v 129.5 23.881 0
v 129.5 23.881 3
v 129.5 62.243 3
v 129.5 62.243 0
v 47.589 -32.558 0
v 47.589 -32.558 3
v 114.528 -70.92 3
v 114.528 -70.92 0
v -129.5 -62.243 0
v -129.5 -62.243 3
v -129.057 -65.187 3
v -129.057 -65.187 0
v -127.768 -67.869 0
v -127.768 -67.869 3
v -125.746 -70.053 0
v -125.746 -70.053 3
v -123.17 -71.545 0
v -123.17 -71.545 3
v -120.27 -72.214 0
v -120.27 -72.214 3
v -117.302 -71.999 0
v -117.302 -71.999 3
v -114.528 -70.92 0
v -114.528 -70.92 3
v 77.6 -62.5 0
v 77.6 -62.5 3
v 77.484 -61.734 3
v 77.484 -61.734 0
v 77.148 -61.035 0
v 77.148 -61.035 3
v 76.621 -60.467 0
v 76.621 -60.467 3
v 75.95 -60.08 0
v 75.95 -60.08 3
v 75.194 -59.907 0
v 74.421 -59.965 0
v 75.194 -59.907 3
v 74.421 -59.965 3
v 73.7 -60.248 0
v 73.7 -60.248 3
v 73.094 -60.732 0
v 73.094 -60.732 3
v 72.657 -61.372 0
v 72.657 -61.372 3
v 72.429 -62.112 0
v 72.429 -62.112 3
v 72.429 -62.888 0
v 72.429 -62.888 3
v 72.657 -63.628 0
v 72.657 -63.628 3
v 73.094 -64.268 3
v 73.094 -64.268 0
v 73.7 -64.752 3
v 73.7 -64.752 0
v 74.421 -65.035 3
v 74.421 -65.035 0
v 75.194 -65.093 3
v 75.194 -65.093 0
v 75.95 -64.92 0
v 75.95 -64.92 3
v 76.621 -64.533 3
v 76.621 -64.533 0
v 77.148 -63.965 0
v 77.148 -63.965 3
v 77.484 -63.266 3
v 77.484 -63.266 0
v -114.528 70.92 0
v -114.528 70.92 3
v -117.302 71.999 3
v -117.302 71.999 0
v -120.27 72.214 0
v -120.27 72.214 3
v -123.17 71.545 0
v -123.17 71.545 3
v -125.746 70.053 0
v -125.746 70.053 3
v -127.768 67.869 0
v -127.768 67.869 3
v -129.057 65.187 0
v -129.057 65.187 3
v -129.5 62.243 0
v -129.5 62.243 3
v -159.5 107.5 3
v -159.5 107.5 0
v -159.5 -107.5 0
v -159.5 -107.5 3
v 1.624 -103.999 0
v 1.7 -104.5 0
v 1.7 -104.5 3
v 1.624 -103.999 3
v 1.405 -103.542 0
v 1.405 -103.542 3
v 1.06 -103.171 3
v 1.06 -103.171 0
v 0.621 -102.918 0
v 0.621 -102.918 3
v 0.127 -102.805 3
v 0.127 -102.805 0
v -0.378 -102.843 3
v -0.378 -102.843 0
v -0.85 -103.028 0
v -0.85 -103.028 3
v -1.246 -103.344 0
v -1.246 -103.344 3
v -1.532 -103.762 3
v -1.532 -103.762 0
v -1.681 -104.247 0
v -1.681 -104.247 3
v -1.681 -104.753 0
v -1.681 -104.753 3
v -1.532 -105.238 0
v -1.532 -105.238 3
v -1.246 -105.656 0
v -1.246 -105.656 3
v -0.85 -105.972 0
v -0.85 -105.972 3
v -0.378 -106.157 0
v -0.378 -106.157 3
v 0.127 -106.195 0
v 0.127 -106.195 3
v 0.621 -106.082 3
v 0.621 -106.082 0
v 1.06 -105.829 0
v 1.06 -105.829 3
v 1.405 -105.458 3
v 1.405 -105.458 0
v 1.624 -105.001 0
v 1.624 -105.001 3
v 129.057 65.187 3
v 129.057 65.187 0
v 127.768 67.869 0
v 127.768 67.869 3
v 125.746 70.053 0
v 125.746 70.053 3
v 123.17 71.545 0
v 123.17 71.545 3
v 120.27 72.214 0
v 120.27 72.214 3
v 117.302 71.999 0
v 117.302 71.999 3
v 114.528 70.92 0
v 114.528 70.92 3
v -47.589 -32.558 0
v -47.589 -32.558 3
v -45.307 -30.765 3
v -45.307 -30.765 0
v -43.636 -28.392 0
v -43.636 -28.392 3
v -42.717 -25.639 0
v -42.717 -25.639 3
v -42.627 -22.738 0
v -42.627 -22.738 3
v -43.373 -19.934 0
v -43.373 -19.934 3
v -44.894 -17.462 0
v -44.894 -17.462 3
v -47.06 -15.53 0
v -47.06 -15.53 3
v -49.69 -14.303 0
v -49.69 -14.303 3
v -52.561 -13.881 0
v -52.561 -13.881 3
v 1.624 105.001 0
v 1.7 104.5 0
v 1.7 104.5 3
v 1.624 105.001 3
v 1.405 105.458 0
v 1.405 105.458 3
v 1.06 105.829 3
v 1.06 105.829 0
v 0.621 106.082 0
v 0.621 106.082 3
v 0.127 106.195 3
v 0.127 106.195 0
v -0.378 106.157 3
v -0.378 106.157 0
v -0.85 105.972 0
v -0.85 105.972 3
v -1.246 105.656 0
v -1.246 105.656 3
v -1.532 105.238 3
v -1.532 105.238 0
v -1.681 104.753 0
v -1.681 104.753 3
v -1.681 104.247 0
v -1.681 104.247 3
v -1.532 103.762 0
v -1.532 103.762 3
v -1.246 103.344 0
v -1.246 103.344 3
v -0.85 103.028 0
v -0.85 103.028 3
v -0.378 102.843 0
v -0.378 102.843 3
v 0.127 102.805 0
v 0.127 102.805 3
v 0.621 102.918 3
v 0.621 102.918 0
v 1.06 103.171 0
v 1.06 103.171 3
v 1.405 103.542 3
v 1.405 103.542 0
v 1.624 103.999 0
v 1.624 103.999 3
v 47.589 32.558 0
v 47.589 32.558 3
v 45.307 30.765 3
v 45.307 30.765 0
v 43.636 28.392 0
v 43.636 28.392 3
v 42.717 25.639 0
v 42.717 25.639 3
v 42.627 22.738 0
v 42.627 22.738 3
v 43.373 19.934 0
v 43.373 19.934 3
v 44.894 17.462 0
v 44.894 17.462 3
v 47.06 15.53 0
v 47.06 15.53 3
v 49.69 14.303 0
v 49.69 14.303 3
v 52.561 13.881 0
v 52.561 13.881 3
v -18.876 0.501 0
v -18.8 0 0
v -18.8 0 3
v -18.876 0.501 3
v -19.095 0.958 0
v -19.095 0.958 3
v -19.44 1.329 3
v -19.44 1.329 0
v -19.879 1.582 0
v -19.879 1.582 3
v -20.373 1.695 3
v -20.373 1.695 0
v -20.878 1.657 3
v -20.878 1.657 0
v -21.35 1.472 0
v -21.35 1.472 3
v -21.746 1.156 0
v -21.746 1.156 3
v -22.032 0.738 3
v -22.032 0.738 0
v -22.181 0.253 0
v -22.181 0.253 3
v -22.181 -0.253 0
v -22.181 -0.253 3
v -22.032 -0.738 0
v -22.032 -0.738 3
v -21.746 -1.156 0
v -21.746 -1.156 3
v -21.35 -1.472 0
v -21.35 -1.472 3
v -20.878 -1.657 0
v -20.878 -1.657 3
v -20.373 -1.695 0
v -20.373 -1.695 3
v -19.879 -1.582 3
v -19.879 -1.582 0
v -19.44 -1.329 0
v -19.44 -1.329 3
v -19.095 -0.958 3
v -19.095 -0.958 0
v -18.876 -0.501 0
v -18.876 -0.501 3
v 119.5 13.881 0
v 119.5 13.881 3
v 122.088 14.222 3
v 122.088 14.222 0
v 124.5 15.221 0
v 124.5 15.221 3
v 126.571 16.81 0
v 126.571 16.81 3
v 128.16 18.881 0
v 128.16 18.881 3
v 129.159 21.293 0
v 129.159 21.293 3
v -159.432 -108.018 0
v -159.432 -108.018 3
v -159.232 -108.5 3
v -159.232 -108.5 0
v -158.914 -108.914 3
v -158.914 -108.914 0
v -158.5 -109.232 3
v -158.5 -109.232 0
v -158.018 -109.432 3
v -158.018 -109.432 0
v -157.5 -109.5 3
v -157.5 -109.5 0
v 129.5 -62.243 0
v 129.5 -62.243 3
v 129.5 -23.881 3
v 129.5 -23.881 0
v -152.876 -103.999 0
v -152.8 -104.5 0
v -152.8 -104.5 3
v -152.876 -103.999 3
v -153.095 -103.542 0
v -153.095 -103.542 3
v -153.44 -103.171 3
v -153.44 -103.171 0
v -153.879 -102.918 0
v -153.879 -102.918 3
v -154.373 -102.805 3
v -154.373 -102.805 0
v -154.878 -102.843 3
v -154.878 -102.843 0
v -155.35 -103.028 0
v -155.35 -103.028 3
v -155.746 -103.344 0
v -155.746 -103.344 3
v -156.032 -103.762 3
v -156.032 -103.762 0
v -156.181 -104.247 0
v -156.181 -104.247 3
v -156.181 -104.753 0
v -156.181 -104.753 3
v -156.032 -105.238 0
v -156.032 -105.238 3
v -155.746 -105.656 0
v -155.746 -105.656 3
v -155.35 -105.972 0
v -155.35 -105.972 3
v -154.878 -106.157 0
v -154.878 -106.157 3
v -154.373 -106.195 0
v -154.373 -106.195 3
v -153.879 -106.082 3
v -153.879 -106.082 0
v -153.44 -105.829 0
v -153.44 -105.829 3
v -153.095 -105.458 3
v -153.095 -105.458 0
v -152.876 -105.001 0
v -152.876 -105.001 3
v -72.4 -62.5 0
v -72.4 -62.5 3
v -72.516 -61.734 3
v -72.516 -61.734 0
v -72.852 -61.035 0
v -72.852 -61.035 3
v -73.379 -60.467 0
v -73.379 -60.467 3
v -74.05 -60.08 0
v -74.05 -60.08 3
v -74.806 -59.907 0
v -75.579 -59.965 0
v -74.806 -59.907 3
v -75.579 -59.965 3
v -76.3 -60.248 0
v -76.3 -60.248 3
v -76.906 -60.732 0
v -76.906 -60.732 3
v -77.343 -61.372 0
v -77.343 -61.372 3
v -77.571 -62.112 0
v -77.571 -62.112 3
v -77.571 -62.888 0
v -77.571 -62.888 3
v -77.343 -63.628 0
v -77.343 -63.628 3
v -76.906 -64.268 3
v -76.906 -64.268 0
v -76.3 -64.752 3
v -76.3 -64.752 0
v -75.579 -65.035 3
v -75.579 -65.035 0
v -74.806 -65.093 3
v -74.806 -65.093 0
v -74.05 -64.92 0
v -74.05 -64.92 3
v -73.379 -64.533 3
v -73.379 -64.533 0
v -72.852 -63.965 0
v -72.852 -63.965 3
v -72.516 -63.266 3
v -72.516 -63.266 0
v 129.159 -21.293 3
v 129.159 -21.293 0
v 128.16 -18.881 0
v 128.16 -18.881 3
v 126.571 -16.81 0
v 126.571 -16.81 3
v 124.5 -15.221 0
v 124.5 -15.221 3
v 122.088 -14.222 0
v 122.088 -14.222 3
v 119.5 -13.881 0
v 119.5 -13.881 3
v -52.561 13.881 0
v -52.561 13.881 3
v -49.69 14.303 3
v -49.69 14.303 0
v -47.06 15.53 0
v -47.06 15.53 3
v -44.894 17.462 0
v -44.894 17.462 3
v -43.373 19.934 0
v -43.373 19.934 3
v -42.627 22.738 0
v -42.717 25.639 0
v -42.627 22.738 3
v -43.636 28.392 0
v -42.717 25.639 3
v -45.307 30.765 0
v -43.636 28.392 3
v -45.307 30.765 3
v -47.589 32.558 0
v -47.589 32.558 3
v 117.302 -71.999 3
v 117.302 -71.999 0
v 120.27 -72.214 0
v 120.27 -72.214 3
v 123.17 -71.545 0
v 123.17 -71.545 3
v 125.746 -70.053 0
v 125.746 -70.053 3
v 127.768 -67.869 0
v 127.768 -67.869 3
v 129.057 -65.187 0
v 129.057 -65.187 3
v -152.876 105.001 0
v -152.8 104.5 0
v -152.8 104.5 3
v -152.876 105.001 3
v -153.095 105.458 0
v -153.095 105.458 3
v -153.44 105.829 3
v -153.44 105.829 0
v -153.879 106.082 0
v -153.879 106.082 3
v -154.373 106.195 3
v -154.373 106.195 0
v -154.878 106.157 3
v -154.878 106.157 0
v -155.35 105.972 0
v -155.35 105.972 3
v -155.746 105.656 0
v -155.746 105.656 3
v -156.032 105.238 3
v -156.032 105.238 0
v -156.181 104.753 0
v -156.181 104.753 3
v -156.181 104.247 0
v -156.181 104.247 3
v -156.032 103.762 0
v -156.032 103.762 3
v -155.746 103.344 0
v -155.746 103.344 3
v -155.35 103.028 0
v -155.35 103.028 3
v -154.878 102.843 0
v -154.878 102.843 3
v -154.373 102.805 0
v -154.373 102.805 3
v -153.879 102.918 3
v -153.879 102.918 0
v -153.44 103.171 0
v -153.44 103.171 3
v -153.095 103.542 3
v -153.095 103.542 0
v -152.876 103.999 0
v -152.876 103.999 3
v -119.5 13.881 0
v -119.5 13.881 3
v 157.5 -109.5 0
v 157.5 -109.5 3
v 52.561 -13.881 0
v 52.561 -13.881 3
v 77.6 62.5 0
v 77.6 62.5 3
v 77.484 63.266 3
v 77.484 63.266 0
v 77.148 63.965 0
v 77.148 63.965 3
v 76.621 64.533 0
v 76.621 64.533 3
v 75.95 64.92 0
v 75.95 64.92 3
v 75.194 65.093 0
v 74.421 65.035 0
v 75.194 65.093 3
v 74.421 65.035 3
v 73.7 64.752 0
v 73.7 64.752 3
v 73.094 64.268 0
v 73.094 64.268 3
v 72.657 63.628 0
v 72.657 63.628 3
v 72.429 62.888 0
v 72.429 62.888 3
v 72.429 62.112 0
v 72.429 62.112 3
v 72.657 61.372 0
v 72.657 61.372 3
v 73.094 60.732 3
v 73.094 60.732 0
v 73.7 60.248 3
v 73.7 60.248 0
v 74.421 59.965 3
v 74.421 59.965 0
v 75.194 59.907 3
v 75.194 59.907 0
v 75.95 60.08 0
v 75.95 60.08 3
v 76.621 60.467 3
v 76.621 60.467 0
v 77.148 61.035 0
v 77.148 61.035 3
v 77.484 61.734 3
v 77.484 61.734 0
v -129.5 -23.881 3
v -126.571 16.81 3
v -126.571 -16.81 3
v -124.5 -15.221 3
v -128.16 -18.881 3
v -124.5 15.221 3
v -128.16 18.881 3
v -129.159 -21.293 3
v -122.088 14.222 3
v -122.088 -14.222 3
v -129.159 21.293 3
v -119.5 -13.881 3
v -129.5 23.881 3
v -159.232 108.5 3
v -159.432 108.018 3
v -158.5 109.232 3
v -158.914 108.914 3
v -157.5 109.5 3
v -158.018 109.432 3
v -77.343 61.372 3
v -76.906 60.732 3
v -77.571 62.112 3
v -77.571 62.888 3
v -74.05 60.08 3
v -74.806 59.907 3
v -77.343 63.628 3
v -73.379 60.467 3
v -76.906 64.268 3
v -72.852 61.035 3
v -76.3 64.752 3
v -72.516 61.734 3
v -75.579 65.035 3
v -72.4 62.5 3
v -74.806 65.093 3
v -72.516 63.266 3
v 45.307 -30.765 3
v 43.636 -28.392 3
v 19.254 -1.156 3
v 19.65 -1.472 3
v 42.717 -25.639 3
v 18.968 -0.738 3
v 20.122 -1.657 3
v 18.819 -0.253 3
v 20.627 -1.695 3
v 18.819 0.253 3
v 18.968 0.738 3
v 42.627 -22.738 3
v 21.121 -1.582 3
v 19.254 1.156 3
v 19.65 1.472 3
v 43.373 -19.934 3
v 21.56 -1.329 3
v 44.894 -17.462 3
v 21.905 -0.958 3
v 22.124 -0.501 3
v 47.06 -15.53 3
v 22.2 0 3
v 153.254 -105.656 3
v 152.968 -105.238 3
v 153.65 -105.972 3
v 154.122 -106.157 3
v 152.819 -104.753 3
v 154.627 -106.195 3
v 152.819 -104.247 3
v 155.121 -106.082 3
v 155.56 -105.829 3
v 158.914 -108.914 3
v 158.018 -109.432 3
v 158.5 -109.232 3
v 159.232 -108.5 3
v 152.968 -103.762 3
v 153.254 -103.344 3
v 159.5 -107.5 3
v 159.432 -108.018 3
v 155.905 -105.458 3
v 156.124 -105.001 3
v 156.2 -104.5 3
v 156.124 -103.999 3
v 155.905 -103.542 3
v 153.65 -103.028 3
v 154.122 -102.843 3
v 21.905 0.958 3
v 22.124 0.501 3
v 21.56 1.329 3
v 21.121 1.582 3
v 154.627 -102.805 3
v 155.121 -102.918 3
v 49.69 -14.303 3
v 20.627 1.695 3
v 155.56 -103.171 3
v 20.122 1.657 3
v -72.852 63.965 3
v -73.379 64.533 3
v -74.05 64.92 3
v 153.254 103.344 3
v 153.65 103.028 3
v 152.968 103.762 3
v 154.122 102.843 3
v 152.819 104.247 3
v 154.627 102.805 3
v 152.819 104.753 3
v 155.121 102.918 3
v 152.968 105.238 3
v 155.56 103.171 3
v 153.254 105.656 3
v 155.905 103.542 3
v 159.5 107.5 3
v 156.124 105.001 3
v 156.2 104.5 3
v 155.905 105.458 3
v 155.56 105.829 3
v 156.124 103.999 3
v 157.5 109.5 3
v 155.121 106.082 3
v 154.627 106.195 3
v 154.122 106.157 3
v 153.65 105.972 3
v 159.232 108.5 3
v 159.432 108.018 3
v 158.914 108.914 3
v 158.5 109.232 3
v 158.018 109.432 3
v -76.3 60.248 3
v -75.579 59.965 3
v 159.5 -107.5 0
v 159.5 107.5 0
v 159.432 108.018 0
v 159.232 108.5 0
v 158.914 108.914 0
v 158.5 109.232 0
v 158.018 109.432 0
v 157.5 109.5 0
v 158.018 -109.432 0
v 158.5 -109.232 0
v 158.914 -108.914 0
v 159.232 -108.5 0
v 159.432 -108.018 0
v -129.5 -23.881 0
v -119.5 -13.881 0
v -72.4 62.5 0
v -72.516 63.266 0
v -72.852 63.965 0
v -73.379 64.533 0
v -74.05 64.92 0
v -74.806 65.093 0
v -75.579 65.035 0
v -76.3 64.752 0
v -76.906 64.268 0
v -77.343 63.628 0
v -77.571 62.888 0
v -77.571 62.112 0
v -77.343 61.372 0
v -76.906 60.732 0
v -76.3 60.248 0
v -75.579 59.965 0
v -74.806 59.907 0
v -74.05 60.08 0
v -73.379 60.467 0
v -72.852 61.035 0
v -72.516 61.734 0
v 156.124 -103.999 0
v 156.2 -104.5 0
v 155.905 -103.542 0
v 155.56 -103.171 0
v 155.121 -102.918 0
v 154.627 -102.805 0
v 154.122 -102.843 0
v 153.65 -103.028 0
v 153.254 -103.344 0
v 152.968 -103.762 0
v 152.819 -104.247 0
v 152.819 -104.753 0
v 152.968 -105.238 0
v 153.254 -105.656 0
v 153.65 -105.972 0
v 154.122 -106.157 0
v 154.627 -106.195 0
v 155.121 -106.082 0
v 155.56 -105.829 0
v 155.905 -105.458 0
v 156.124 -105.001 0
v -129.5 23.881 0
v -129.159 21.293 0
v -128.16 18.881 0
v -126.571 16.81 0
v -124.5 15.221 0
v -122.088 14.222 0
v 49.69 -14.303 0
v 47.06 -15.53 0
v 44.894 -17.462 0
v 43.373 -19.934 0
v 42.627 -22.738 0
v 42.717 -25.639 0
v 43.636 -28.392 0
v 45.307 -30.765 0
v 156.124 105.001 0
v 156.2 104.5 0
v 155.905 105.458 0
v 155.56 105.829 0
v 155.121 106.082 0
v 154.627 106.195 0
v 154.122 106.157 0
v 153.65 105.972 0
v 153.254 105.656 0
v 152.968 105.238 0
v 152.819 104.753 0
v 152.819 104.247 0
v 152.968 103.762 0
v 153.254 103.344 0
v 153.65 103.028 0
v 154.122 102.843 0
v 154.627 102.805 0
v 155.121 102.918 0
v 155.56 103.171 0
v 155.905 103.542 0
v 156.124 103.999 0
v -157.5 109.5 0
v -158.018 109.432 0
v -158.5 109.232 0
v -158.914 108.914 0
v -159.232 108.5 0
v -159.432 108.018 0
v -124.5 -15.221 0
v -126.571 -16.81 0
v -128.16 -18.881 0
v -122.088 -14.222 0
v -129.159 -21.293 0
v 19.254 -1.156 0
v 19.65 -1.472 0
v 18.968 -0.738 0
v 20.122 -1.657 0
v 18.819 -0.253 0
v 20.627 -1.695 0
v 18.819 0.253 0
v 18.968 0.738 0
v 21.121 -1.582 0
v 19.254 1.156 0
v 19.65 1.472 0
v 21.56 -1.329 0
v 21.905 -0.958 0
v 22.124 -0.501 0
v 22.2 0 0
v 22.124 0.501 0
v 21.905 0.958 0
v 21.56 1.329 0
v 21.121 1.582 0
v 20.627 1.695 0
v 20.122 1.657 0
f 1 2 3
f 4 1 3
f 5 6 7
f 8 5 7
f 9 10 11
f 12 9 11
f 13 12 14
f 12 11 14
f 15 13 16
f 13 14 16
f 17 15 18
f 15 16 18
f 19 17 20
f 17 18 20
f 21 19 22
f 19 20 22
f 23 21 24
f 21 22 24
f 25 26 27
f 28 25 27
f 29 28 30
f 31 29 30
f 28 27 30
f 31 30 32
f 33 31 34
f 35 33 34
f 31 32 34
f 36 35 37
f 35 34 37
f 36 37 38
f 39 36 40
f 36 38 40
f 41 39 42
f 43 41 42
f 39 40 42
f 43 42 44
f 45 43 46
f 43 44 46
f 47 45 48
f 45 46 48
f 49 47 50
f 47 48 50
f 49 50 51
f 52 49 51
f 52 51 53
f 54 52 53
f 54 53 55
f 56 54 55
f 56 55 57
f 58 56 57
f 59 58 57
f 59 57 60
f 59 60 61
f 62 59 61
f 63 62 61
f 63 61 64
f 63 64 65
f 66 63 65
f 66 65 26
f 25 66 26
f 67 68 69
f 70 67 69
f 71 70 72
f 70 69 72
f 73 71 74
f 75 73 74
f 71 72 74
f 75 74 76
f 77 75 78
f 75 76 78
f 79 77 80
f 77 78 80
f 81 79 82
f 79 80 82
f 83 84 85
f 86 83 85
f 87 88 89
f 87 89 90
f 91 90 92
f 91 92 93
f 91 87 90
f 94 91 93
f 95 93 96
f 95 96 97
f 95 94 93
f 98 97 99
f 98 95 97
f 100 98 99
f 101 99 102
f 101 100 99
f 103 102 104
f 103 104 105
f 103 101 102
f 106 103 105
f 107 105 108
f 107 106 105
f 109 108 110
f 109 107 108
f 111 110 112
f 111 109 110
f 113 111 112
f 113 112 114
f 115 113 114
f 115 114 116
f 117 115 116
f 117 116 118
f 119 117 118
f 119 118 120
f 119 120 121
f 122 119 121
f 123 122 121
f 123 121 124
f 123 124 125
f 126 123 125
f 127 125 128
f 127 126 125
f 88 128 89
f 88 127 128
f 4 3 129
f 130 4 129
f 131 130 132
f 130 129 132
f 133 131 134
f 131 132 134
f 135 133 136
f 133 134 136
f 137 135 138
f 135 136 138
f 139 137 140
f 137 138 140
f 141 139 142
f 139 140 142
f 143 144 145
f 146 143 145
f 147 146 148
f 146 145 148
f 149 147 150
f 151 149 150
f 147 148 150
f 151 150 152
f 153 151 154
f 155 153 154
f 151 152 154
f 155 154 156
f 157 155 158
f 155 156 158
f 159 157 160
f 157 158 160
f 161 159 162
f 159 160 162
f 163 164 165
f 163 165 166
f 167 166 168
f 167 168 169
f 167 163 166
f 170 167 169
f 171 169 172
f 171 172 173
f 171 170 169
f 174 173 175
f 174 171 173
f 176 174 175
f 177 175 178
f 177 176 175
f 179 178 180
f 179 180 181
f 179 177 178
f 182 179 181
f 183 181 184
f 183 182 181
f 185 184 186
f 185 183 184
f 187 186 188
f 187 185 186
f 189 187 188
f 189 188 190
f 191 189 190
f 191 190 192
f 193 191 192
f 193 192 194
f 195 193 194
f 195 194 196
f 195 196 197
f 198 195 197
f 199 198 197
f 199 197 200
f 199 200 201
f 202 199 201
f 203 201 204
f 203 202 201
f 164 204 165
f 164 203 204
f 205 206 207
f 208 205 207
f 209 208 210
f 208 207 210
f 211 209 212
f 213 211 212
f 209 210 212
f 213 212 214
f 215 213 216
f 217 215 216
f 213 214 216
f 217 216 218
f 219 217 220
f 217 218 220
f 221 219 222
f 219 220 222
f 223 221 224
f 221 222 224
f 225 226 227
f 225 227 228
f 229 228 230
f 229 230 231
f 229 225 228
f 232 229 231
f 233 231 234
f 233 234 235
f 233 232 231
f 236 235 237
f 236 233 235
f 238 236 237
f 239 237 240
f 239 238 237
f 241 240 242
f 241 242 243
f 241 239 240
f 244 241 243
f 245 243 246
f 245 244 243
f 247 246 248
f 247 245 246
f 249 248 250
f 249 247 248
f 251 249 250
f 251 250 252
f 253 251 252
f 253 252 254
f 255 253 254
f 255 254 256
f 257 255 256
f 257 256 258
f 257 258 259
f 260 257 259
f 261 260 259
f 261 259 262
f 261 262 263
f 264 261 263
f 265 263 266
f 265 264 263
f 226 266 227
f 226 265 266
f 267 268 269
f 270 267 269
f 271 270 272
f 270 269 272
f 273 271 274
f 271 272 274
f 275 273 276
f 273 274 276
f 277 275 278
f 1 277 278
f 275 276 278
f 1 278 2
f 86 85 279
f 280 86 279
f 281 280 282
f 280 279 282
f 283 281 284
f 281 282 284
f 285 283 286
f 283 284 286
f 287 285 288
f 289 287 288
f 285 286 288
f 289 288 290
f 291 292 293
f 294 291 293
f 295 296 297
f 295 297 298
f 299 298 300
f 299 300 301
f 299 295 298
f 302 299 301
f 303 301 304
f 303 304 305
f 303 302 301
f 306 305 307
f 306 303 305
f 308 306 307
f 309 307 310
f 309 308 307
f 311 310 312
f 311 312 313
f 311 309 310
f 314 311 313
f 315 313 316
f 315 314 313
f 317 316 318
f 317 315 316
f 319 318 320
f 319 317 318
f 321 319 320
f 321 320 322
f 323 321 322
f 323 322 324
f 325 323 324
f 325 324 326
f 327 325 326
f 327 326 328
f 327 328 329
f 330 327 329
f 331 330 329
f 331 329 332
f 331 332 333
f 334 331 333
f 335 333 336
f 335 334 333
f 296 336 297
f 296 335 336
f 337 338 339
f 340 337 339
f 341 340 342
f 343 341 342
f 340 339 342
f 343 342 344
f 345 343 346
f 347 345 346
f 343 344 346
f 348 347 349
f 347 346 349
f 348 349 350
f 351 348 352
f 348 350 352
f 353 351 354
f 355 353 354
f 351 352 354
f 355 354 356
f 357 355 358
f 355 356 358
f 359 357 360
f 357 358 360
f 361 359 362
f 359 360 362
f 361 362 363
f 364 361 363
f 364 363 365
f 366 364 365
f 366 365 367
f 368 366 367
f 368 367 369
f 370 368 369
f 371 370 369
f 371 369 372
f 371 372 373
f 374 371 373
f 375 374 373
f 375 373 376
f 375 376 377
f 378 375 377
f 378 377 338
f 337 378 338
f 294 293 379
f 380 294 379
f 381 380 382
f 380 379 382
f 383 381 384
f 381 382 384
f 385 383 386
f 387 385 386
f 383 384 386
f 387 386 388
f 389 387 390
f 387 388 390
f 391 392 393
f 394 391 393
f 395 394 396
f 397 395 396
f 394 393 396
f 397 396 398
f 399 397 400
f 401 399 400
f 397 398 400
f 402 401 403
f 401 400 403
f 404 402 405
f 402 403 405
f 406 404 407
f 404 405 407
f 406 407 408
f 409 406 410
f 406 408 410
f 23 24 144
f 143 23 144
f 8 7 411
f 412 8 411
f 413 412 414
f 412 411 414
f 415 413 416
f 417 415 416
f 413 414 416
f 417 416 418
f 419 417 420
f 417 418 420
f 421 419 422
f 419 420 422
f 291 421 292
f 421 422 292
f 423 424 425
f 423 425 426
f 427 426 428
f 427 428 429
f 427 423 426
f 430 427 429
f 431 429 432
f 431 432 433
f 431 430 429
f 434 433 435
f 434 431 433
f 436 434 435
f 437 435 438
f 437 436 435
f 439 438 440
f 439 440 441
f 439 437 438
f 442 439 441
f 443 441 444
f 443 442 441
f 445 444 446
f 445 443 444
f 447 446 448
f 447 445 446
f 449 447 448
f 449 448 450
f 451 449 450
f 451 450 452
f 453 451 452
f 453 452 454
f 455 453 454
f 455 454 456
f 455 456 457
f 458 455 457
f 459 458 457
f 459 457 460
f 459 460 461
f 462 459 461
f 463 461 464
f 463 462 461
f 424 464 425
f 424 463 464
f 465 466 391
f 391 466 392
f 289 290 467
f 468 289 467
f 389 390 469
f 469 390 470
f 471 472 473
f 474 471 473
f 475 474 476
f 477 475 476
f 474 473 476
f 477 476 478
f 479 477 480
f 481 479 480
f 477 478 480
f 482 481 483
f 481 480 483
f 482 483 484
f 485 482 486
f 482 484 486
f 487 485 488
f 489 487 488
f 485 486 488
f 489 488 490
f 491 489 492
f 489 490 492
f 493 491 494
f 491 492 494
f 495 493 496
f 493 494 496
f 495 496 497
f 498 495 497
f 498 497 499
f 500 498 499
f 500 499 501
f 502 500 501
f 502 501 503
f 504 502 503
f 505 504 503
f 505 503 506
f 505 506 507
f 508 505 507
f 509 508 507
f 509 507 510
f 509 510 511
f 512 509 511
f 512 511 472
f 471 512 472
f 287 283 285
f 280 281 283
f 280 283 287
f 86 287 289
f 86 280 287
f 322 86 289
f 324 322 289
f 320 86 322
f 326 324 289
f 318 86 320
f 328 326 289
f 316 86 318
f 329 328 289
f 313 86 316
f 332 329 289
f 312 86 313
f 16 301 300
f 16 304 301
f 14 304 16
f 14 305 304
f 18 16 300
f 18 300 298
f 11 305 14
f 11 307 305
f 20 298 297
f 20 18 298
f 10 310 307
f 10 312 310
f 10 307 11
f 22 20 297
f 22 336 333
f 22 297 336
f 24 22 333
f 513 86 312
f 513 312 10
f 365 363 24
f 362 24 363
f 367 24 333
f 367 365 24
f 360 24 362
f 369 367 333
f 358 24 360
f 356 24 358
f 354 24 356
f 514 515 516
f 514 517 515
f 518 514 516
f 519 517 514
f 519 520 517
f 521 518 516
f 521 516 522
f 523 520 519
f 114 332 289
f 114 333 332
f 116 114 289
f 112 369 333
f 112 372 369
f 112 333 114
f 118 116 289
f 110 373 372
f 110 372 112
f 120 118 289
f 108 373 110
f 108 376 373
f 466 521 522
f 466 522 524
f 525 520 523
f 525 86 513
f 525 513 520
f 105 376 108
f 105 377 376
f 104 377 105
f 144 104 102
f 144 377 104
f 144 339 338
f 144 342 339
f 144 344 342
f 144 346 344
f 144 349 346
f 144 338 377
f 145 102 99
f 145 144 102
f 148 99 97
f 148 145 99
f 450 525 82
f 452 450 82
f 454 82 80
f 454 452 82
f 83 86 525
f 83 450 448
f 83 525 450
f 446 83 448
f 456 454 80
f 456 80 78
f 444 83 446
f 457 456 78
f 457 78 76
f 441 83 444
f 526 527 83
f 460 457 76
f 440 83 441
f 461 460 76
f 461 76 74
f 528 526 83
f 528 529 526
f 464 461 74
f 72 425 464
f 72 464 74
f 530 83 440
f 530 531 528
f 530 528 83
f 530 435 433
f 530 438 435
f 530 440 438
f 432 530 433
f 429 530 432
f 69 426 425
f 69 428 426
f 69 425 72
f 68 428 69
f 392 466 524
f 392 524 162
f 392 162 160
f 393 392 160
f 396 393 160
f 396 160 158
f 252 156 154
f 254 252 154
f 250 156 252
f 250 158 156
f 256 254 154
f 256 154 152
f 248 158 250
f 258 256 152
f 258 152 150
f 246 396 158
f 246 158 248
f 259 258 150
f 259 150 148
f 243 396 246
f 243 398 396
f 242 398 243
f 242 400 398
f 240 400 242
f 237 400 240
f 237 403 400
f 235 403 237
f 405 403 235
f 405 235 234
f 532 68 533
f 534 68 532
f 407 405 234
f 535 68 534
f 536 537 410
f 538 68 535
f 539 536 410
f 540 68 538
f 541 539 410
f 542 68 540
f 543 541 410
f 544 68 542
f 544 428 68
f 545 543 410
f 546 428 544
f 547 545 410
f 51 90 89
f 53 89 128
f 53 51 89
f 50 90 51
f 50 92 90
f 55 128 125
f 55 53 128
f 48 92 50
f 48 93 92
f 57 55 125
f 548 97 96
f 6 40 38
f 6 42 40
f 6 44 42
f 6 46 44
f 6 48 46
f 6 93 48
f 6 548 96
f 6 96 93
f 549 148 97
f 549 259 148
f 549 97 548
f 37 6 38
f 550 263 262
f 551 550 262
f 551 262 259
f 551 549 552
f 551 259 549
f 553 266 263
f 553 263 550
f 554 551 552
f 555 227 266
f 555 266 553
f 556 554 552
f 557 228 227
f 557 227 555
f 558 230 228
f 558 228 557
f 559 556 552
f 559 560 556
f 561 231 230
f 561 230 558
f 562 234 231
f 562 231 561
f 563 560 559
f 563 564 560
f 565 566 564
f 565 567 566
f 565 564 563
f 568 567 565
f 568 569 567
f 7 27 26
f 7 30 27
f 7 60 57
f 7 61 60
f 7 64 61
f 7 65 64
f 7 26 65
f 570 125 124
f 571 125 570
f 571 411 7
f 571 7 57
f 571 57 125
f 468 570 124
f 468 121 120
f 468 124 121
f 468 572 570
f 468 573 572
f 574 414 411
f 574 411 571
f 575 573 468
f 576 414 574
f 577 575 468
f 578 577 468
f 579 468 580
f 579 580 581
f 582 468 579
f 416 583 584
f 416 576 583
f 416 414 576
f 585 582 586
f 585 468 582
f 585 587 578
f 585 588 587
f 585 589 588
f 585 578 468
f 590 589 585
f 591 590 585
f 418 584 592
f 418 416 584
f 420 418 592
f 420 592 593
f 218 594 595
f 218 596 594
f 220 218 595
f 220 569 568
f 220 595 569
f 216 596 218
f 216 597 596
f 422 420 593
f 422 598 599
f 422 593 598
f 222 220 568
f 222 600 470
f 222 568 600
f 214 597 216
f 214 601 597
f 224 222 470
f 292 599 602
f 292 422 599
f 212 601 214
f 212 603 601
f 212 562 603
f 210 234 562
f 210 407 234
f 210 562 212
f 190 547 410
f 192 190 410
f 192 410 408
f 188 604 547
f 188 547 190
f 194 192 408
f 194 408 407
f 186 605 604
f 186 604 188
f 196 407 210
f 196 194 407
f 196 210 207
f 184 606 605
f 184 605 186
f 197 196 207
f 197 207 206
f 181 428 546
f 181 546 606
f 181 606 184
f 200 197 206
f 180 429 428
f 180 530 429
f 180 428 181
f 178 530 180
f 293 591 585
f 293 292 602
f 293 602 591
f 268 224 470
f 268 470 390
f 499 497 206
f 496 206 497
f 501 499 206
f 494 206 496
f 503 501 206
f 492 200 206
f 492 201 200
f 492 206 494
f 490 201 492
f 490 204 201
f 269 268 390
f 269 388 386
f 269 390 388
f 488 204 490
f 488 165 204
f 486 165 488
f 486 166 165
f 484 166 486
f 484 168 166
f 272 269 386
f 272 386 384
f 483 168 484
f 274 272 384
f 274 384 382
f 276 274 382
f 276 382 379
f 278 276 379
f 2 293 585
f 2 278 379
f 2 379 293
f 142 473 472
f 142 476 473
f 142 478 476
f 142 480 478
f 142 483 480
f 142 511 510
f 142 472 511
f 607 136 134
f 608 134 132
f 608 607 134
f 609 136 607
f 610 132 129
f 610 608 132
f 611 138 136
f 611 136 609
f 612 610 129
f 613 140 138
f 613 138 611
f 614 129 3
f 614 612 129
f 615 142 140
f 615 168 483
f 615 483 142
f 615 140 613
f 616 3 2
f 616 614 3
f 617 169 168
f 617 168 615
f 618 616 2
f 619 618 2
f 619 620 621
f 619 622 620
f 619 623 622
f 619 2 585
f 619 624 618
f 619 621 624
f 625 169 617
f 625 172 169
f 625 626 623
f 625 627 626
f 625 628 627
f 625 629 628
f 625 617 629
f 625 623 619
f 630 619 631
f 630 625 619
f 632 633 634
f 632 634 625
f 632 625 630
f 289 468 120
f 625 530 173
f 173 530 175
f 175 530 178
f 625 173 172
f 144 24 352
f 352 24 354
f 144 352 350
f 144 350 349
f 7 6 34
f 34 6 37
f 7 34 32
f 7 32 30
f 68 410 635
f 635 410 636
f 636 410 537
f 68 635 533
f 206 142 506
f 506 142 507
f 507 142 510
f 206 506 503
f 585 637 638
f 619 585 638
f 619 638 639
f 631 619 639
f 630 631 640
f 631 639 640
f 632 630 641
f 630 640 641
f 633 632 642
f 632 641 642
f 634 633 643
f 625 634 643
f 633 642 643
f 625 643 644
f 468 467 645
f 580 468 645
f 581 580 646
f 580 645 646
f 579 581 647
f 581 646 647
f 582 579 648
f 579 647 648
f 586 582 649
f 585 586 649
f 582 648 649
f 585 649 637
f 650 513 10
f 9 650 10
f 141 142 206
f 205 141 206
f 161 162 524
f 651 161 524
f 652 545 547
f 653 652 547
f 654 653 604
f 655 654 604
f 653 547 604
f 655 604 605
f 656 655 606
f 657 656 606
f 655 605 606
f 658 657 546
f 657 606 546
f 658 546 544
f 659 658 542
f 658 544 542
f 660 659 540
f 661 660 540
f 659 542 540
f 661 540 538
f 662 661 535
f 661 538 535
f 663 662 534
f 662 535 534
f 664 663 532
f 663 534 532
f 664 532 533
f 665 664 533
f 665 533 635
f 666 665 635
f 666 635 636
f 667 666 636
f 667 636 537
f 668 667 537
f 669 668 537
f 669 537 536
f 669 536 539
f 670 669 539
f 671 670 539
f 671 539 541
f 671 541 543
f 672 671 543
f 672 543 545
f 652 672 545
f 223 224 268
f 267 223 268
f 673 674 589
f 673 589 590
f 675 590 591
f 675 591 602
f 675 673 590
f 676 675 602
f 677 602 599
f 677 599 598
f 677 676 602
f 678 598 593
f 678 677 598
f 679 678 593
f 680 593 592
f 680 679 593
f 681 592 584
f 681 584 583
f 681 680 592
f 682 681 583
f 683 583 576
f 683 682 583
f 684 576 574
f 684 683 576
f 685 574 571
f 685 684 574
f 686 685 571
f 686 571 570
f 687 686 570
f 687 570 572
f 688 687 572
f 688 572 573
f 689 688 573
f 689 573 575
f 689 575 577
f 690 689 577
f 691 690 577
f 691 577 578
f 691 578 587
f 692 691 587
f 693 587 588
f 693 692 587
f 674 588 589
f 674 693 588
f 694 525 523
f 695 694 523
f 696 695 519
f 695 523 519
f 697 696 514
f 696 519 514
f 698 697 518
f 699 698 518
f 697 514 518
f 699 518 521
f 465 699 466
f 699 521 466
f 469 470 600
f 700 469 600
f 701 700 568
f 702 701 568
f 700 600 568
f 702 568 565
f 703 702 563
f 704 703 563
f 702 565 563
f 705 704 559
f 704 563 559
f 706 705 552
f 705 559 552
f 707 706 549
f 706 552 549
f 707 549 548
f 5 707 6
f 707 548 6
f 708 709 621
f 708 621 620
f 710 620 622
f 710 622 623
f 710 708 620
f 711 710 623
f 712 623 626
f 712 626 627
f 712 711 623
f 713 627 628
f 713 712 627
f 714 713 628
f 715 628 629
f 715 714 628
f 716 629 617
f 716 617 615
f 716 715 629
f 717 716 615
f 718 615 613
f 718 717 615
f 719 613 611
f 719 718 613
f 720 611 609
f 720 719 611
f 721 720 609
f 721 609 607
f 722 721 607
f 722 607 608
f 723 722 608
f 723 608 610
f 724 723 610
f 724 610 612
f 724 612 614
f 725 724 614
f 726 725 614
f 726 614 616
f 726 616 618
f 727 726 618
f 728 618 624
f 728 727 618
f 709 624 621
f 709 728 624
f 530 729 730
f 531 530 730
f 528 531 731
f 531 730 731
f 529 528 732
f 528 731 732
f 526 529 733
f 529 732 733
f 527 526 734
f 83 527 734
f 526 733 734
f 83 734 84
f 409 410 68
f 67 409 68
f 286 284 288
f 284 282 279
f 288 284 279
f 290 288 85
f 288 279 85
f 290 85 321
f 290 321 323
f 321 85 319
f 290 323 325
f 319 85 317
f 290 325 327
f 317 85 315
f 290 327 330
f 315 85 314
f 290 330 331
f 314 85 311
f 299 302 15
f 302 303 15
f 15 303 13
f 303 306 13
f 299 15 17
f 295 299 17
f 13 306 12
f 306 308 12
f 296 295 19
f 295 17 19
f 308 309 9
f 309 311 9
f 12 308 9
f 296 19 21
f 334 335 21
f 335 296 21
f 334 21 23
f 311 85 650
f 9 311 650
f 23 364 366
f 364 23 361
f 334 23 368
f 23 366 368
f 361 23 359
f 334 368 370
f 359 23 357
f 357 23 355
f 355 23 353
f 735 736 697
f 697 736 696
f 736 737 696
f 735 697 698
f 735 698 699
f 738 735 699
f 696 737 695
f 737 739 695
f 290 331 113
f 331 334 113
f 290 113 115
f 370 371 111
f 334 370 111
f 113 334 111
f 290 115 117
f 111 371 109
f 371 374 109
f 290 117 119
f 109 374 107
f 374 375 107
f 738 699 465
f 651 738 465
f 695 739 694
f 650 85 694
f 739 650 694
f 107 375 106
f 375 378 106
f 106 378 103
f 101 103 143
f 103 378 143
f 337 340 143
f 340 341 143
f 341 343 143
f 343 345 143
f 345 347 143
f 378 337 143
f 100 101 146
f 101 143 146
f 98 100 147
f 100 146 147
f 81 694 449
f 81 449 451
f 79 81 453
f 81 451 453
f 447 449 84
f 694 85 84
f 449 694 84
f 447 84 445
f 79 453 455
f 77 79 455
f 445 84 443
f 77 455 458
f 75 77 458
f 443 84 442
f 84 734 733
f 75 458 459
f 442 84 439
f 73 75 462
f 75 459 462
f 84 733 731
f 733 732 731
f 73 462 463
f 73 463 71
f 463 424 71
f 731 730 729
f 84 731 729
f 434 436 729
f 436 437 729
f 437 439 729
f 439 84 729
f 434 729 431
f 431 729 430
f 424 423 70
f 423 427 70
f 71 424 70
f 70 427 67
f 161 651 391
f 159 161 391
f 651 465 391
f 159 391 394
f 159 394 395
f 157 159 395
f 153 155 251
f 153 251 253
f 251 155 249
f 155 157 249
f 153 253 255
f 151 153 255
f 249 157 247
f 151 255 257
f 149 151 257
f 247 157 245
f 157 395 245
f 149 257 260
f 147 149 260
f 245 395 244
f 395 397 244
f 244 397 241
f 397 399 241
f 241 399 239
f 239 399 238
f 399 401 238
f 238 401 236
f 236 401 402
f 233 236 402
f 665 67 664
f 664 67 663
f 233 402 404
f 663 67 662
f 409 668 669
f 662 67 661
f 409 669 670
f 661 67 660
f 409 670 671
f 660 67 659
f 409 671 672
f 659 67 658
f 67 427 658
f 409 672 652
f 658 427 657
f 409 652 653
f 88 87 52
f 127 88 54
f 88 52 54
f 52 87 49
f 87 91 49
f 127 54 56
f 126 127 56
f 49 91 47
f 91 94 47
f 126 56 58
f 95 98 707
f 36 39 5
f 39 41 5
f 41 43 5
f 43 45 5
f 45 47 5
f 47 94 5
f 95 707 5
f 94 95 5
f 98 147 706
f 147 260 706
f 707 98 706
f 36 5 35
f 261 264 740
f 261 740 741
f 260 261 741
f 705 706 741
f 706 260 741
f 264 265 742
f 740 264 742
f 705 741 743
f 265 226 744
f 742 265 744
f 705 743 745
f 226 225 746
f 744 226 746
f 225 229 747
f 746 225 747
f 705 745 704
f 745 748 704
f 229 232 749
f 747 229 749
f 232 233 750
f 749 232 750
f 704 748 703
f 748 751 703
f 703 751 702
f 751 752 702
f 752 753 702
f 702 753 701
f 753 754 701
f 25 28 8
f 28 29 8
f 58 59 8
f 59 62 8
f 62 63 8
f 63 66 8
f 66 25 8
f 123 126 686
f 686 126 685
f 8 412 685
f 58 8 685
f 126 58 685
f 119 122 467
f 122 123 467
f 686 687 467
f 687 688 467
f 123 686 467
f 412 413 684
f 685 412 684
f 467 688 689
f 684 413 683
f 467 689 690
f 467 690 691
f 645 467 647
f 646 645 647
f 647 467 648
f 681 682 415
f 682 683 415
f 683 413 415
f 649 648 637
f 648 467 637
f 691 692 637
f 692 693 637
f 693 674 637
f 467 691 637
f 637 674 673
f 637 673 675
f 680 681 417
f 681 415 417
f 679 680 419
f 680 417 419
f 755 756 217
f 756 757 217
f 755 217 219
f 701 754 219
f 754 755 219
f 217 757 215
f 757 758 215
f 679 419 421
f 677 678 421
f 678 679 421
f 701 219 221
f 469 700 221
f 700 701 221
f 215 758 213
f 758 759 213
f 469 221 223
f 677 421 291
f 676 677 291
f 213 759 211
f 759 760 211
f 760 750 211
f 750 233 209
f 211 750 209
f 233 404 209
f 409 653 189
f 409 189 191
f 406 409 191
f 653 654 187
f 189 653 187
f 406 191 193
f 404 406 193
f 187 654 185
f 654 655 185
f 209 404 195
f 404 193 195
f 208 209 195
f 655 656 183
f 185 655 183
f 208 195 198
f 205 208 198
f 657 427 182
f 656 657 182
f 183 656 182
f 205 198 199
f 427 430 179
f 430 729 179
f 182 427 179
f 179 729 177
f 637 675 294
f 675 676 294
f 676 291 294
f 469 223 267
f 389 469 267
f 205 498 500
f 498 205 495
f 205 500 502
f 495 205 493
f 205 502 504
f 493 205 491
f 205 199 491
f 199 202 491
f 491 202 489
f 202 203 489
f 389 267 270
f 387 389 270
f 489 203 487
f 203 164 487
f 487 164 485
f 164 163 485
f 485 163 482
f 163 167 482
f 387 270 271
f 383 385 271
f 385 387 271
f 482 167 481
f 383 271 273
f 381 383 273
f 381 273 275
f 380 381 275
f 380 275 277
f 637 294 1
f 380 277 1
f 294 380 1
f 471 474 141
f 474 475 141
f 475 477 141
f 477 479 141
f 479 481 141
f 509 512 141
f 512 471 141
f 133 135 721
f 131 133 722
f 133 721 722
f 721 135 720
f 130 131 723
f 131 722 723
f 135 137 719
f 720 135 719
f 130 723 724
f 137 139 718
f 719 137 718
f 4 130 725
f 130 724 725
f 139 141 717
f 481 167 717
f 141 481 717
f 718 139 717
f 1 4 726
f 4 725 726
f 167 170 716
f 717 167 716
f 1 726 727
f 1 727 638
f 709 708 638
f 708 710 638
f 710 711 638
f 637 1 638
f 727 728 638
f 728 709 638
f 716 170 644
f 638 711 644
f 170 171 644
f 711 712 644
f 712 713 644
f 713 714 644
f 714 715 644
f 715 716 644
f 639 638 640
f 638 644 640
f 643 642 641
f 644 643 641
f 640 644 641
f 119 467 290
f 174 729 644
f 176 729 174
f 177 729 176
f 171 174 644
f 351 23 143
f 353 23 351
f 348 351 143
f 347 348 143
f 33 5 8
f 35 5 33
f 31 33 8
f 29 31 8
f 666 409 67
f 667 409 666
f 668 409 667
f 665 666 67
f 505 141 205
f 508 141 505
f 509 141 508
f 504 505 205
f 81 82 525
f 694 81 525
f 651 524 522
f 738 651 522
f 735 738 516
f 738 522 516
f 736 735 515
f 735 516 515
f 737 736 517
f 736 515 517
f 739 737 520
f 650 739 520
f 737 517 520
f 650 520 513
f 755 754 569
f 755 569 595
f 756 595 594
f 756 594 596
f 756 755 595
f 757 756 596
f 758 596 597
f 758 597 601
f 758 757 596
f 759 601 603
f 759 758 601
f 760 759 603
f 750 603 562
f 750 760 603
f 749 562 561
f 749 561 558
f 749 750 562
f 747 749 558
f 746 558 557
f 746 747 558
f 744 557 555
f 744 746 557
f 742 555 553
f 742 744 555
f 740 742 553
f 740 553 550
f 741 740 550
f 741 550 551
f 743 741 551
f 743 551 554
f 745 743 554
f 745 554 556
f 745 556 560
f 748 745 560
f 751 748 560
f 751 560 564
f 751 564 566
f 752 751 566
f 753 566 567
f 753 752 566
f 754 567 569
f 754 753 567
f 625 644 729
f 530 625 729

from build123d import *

# Parameters (mm, degrees)
F0_R     = 1.7
F1_DEPTH = 3
F3_DEPTH = 3.001
F4_R     = 2.6
F5_DEPTH = 25


with BuildPart() as f1:
    # F0 (on Top) → F1 (new body)
    with BuildSketch(Plane.XY):
        with BuildLine():
            Line((-157.5, -109.5), (157.5, -109.5))
            ThreePointArc((157.5, -109.5), (158.914214, -108.914214), (159.5, -107.5))
            Line((159.5, -107.5), (159.5, 107.5))
            ThreePointArc((159.5, 107.5), (158.914214, 108.914214), (157.5, 109.5))
            Line((157.5, 109.5), (-157.5, 109.5))
            ThreePointArc((-157.5, 109.5), (-158.914214, 108.914214), (-159.5, 107.5))
            Line((-159.5, 107.5), (-159.5, -107.5))
            ThreePointArc((-159.5, -107.5), (-158.914214, -108.914214), (-157.5, -109.5))
        make_face()
        with Locations((-154.5, -104.5)):
            Circle(F0_R, mode=Mode.SUBTRACT)
        with Locations((0, -104.5)):
            Circle(F0_R, mode=Mode.SUBTRACT)
        with Locations((154.5, -104.5)):
            Circle(F0_R, mode=Mode.SUBTRACT)
        with Locations((-20.5, 0)):
            Circle(F0_R, mode=Mode.SUBTRACT)
        with Locations((-154.5, 104.5)):
            Circle(F0_R, mode=Mode.SUBTRACT)
        with Locations((20.5, 0)):
            Circle(F0_R, mode=Mode.SUBTRACT)
        with Locations((0, 104.5)):
            Circle(F0_R, mode=Mode.SUBTRACT)
        with Locations((154.5, 104.5)):
            Circle(F0_R, mode=Mode.SUBTRACT)
    extrude(amount=F1_DEPTH)

    # F2 (on face) → F3 (cut, through all)
    with BuildSketch(Plane.XY.offset(3)):
        with BuildLine():
            Line((-129.5, 62.243366), (-129.5, 23.88142))
            ThreePointArc((-129.5, 23.88142), (-126.571068, 16.810352), (-119.5, 13.88142))
            Line((-119.5, 13.88142), (-52.560989, 13.88142))
            ThreePointArc((-52.560989, 13.88142), (-42.897598, 21.3087), (-47.588749, 32.557642))
            Line((-47.588749, 32.557642), (-114.527761, 70.919589))
            ThreePointArc((-114.527761, 70.919589), (-124.513861, 70.895603), (-129.5, 62.243366))
        make_face()
        with BuildLine():
            Line((52.560989, 13.88142), (119.5, 13.88142))
            ThreePointArc((119.5, 13.88142), (126.571068, 16.810352), (129.5, 23.88142))
            Line((129.5, 23.88142), (129.5, 62.243366))
            ThreePointArc((129.5, 62.243366), (124.513861, 70.895603), (114.527761, 70.919589))
            Line((114.527761, 70.919589), (47.588749, 32.557642))
            ThreePointArc((47.588749, 32.557642), (42.897598, 21.3087), (52.560989, 13.88142))
        make_face()
        with BuildLine():
            ThreePointArc((114.527761, -70.919589), (124.513861, -70.895603), (129.5, -62.243366))
            Line((129.5, -62.243366), (129.5, -23.88142))
            ThreePointArc((129.5, -23.88142), (126.571068, -16.810352), (119.5, -13.88142))
            Line((119.5, -13.88142), (52.560989, -13.88142))
            ThreePointArc((52.560989, -13.88142), (42.897598, -21.3087), (47.588749, -32.557642))
            Line((47.588749, -32.557642), (114.527761, -70.919589))
        make_face()
        with BuildLine():
            Line((-129.5, -23.88142), (-129.5, -62.243366))
            ThreePointArc((-129.5, -62.243366), (-124.513861, -70.895603), (-114.527761, -70.919589))
            Line((-114.527761, -70.919589), (-47.588749, -32.557642))
            ThreePointArc((-47.588749, -32.557642), (-42.897598, -21.3087), (-52.560989, -13.88142))
            Line((-52.560989, -13.88142), (-119.5, -13.88142))
            ThreePointArc((-119.5, -13.88142), (-126.571068, -16.810352), (-129.5, -23.88142))
        make_face()
    extrude(amount=-F3_DEPTH, mode=Mode.SUBTRACT)

    # F4 (on face) → F5 (cut)
    with BuildSketch(Plane.XY.offset(3)):
        with Locations((-75, 62.5)):
            Circle(F4_R)
        with Locations((-75, -62.5)):
            Circle(F4_R)
        with Locations((75, 62.5)):
            Circle(F4_R)
        with Locations((75, -62.5)):
            Circle(F4_R)
    extrude(amount=-F5_DEPTH, mode=Mode.SUBTRACT)


solid = f1.part
